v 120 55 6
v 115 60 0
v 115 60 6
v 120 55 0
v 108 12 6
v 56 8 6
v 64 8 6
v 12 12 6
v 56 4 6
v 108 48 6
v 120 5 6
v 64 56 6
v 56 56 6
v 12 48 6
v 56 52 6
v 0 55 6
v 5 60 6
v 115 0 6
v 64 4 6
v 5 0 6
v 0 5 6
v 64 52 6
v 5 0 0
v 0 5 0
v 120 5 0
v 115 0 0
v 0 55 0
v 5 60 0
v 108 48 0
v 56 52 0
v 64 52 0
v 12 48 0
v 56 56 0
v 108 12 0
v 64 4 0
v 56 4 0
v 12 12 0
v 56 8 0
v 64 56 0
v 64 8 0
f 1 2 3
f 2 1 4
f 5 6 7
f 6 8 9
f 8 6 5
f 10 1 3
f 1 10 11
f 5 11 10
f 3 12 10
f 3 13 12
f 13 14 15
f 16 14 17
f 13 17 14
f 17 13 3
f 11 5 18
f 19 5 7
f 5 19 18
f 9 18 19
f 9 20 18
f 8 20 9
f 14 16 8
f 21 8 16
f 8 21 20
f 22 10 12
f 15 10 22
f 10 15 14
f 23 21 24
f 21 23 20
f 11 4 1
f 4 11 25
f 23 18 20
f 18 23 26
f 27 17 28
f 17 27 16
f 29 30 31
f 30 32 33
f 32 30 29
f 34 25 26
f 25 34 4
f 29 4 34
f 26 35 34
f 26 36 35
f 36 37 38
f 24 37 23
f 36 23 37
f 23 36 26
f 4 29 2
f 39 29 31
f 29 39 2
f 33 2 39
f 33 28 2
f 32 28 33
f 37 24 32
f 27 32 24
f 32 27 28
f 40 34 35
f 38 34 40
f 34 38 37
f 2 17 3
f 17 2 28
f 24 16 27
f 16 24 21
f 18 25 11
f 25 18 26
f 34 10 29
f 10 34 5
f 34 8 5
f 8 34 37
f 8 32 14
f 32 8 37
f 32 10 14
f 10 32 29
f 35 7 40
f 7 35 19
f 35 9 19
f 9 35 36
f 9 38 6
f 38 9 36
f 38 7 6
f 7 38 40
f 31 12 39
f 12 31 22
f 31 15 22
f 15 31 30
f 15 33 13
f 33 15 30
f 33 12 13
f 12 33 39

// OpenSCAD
$fn = 32;

// ----------------------------------------------------------------------
// Frame plate: 120 x 60 frame, 12 mm rails
// ----------------------------------------------------------------------

// --- parameters (mm) ---
plate_l = 120;            // plate length, X
plate_w = 60;             // plate width, Y
plate_t = 6;              // plate thickness, Z (extrusion height)
corner_c = 5;             // corner chamfer
frame_bar = 12;           // frame rail width
slot_l = 8;               // adjustment slot length
slot_w = 4;               // adjustment slot width

win_l = plate_l - 2 * frame_bar;  // window length
win_w = plate_w - 2 * frame_bar;  // window width

profile = [[5, 0], [115, 0], [120, 5], [120, 55], [115, 60], [5, 60], [0, 55], [0, 5]];  // primary outline, 8 points, counter clockwise
void_1 = [[12, 12], [108, 12], [108, 48], [12, 48]];  // the window, 4 points
void_2 = [[56, 4], [64, 4], [64, 8], [56, 8]];  // adjustment slot, 4 points
void_3 = [[56, 52], [64, 52], [64, 56], [56, 56]];  // adjustment slot, 4 points

// --- the one profile operation ---
difference() {
  linear_extrude(height = plate_t) polygon(points = profile);
  translate([0, 0, -1])
    linear_extrude(height = plate_t + 2) polygon(points = void_1);
  translate([0, 0, -1])
    linear_extrude(height = plate_t + 2) polygon(points = void_2);
  translate([0, 0, -1])
    linear_extrude(height = plate_t + 2) polygon(points = void_3);
}
